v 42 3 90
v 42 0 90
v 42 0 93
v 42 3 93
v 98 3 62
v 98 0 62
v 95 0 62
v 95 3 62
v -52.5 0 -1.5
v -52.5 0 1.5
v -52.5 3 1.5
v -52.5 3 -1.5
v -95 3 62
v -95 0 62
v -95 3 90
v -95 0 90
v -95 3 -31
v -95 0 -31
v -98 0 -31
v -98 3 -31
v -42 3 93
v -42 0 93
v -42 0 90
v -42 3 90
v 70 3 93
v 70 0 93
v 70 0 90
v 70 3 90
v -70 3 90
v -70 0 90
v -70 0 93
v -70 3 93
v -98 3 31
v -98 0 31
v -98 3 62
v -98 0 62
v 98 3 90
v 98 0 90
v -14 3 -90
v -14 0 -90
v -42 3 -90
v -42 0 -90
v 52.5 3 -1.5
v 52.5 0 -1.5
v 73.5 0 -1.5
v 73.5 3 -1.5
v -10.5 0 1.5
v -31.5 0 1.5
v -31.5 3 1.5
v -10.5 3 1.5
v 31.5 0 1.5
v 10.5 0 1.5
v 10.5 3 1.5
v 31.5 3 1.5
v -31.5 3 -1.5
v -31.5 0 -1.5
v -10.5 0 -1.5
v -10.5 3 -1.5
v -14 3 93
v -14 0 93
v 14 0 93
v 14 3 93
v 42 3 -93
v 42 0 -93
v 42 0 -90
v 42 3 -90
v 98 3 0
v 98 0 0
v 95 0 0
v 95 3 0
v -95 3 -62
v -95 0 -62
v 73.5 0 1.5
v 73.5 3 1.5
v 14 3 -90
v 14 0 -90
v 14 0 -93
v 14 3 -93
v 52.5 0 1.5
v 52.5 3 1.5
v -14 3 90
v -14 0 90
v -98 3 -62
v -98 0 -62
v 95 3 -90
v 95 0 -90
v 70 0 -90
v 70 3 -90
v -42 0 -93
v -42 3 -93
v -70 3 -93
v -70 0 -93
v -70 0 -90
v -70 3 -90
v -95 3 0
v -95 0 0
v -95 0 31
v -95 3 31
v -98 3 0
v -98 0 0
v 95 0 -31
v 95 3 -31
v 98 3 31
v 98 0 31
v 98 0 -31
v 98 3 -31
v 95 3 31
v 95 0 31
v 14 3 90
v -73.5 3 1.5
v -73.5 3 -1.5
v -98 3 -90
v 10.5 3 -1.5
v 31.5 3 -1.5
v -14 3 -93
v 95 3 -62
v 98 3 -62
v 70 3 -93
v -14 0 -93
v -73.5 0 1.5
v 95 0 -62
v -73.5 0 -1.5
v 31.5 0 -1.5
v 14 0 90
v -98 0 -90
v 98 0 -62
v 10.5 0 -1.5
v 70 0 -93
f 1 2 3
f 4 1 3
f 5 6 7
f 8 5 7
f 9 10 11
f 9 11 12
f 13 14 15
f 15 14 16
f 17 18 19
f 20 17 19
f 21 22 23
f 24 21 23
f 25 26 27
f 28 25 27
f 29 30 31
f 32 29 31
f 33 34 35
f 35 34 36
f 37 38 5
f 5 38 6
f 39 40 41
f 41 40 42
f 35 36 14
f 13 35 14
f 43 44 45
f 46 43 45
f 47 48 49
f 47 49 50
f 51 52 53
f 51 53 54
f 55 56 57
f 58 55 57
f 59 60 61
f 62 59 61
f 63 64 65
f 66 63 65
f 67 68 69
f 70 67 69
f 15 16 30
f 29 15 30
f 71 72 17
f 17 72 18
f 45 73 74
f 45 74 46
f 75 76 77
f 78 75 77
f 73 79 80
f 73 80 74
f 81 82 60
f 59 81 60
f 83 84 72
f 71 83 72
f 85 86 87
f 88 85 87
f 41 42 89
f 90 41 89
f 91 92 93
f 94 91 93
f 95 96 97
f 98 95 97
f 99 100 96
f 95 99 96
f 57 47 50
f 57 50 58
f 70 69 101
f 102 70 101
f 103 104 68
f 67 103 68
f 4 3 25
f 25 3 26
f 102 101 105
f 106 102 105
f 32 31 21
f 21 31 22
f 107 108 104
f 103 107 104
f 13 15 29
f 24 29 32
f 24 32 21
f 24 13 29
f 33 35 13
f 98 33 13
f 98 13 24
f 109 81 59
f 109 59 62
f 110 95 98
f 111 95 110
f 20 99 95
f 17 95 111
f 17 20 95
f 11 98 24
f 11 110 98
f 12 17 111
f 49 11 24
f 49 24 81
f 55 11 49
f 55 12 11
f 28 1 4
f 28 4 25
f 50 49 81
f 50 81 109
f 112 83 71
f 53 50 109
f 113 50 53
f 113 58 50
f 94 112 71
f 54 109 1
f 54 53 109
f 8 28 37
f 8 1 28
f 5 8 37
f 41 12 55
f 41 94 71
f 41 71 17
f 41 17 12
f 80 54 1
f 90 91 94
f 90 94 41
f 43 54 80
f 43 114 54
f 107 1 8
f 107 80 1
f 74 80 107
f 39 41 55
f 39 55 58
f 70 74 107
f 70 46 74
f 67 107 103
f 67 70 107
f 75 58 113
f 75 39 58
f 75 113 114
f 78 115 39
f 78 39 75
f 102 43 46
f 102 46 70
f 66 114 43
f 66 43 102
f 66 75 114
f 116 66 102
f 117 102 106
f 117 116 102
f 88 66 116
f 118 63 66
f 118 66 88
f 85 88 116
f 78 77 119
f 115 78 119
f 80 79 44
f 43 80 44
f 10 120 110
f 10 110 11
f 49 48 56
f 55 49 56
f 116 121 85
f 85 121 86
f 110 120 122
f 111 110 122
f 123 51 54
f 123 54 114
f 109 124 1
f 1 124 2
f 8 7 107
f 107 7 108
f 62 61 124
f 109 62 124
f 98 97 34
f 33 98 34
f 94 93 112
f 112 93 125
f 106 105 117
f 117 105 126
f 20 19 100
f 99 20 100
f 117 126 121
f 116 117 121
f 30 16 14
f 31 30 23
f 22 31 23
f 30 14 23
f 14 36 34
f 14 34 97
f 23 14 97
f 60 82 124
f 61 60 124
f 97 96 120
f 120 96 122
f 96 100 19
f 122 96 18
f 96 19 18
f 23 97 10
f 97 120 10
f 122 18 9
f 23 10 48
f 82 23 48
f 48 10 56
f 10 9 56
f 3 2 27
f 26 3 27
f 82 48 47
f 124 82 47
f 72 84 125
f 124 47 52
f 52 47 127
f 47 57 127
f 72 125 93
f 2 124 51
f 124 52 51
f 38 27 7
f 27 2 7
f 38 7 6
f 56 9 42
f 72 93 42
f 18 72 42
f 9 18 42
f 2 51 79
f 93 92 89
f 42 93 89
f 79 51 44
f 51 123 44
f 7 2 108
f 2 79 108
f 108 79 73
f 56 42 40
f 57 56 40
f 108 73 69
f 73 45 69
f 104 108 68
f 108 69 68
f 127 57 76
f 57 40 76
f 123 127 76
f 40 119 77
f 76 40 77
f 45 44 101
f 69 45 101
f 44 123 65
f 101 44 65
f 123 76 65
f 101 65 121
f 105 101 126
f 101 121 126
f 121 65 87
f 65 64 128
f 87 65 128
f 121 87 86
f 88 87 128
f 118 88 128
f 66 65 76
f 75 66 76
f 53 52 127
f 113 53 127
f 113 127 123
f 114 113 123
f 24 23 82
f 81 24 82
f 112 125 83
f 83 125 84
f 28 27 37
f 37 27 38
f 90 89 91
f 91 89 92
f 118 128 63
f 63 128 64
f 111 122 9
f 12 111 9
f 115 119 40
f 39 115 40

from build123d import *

# Parameters (mm, degrees)
SKETCH1_W           = 21
SKETCH1_H           = 3
BOSS_EXTRUDE1_DEPTH = 3


with BuildPart() as part:
    # Sketch1 → Boss-Extrude1 (new body)
    with BuildSketch(Plane(origin=(0, 0, 0), x_dir=(1, 0, 0), z_dir=(0, 1, 0))):
        Polygon((-95, -62), (-95, -90), (-70, -90), (-70, -93), (-42, -93), (-42, -90), (-14, -90), (-14, -93), (14, -93), (14, -90), (42, -90), (42, -93), (70, -93), (70, -90), (98, -90), (98, -62), (95, -62), (95, -31), (98, -31), (98, 0), (95, 0), (95, 31), (98, 31), (98, 62), (95, 62), (95, 90), (70, 90), (70, 93), (42, 93), (42, 90), (14, 90), (14, 93), (-14, 93), (-14, 90), (-42, 90), (-42, 93), (-70, 93), (-70, 90), (-98, 90), (-98, 62), (-95, 62), (-95, 31), (-98, 31), (-98, 0), (-95, 0), (-95, -31), (-98, -31), (-98, -62), align=None)
        with Locations((-63, 0)):
            Rectangle(SKETCH1_W, SKETCH1_H, mode=Mode.SUBTRACT)
        with Locations((-21, 0)):
            Rectangle(SKETCH1_W, SKETCH1_H, mode=Mode.SUBTRACT)
        with Locations((21, 0)):
            Rectangle(SKETCH1_W, SKETCH1_H, mode=Mode.SUBTRACT)
        with Locations((63, 0)):
            Rectangle(SKETCH1_W, SKETCH1_H, mode=Mode.SUBTRACT)
    extrude(amount=BOSS_EXTRUDE1_DEPTH)


solid = part.part
